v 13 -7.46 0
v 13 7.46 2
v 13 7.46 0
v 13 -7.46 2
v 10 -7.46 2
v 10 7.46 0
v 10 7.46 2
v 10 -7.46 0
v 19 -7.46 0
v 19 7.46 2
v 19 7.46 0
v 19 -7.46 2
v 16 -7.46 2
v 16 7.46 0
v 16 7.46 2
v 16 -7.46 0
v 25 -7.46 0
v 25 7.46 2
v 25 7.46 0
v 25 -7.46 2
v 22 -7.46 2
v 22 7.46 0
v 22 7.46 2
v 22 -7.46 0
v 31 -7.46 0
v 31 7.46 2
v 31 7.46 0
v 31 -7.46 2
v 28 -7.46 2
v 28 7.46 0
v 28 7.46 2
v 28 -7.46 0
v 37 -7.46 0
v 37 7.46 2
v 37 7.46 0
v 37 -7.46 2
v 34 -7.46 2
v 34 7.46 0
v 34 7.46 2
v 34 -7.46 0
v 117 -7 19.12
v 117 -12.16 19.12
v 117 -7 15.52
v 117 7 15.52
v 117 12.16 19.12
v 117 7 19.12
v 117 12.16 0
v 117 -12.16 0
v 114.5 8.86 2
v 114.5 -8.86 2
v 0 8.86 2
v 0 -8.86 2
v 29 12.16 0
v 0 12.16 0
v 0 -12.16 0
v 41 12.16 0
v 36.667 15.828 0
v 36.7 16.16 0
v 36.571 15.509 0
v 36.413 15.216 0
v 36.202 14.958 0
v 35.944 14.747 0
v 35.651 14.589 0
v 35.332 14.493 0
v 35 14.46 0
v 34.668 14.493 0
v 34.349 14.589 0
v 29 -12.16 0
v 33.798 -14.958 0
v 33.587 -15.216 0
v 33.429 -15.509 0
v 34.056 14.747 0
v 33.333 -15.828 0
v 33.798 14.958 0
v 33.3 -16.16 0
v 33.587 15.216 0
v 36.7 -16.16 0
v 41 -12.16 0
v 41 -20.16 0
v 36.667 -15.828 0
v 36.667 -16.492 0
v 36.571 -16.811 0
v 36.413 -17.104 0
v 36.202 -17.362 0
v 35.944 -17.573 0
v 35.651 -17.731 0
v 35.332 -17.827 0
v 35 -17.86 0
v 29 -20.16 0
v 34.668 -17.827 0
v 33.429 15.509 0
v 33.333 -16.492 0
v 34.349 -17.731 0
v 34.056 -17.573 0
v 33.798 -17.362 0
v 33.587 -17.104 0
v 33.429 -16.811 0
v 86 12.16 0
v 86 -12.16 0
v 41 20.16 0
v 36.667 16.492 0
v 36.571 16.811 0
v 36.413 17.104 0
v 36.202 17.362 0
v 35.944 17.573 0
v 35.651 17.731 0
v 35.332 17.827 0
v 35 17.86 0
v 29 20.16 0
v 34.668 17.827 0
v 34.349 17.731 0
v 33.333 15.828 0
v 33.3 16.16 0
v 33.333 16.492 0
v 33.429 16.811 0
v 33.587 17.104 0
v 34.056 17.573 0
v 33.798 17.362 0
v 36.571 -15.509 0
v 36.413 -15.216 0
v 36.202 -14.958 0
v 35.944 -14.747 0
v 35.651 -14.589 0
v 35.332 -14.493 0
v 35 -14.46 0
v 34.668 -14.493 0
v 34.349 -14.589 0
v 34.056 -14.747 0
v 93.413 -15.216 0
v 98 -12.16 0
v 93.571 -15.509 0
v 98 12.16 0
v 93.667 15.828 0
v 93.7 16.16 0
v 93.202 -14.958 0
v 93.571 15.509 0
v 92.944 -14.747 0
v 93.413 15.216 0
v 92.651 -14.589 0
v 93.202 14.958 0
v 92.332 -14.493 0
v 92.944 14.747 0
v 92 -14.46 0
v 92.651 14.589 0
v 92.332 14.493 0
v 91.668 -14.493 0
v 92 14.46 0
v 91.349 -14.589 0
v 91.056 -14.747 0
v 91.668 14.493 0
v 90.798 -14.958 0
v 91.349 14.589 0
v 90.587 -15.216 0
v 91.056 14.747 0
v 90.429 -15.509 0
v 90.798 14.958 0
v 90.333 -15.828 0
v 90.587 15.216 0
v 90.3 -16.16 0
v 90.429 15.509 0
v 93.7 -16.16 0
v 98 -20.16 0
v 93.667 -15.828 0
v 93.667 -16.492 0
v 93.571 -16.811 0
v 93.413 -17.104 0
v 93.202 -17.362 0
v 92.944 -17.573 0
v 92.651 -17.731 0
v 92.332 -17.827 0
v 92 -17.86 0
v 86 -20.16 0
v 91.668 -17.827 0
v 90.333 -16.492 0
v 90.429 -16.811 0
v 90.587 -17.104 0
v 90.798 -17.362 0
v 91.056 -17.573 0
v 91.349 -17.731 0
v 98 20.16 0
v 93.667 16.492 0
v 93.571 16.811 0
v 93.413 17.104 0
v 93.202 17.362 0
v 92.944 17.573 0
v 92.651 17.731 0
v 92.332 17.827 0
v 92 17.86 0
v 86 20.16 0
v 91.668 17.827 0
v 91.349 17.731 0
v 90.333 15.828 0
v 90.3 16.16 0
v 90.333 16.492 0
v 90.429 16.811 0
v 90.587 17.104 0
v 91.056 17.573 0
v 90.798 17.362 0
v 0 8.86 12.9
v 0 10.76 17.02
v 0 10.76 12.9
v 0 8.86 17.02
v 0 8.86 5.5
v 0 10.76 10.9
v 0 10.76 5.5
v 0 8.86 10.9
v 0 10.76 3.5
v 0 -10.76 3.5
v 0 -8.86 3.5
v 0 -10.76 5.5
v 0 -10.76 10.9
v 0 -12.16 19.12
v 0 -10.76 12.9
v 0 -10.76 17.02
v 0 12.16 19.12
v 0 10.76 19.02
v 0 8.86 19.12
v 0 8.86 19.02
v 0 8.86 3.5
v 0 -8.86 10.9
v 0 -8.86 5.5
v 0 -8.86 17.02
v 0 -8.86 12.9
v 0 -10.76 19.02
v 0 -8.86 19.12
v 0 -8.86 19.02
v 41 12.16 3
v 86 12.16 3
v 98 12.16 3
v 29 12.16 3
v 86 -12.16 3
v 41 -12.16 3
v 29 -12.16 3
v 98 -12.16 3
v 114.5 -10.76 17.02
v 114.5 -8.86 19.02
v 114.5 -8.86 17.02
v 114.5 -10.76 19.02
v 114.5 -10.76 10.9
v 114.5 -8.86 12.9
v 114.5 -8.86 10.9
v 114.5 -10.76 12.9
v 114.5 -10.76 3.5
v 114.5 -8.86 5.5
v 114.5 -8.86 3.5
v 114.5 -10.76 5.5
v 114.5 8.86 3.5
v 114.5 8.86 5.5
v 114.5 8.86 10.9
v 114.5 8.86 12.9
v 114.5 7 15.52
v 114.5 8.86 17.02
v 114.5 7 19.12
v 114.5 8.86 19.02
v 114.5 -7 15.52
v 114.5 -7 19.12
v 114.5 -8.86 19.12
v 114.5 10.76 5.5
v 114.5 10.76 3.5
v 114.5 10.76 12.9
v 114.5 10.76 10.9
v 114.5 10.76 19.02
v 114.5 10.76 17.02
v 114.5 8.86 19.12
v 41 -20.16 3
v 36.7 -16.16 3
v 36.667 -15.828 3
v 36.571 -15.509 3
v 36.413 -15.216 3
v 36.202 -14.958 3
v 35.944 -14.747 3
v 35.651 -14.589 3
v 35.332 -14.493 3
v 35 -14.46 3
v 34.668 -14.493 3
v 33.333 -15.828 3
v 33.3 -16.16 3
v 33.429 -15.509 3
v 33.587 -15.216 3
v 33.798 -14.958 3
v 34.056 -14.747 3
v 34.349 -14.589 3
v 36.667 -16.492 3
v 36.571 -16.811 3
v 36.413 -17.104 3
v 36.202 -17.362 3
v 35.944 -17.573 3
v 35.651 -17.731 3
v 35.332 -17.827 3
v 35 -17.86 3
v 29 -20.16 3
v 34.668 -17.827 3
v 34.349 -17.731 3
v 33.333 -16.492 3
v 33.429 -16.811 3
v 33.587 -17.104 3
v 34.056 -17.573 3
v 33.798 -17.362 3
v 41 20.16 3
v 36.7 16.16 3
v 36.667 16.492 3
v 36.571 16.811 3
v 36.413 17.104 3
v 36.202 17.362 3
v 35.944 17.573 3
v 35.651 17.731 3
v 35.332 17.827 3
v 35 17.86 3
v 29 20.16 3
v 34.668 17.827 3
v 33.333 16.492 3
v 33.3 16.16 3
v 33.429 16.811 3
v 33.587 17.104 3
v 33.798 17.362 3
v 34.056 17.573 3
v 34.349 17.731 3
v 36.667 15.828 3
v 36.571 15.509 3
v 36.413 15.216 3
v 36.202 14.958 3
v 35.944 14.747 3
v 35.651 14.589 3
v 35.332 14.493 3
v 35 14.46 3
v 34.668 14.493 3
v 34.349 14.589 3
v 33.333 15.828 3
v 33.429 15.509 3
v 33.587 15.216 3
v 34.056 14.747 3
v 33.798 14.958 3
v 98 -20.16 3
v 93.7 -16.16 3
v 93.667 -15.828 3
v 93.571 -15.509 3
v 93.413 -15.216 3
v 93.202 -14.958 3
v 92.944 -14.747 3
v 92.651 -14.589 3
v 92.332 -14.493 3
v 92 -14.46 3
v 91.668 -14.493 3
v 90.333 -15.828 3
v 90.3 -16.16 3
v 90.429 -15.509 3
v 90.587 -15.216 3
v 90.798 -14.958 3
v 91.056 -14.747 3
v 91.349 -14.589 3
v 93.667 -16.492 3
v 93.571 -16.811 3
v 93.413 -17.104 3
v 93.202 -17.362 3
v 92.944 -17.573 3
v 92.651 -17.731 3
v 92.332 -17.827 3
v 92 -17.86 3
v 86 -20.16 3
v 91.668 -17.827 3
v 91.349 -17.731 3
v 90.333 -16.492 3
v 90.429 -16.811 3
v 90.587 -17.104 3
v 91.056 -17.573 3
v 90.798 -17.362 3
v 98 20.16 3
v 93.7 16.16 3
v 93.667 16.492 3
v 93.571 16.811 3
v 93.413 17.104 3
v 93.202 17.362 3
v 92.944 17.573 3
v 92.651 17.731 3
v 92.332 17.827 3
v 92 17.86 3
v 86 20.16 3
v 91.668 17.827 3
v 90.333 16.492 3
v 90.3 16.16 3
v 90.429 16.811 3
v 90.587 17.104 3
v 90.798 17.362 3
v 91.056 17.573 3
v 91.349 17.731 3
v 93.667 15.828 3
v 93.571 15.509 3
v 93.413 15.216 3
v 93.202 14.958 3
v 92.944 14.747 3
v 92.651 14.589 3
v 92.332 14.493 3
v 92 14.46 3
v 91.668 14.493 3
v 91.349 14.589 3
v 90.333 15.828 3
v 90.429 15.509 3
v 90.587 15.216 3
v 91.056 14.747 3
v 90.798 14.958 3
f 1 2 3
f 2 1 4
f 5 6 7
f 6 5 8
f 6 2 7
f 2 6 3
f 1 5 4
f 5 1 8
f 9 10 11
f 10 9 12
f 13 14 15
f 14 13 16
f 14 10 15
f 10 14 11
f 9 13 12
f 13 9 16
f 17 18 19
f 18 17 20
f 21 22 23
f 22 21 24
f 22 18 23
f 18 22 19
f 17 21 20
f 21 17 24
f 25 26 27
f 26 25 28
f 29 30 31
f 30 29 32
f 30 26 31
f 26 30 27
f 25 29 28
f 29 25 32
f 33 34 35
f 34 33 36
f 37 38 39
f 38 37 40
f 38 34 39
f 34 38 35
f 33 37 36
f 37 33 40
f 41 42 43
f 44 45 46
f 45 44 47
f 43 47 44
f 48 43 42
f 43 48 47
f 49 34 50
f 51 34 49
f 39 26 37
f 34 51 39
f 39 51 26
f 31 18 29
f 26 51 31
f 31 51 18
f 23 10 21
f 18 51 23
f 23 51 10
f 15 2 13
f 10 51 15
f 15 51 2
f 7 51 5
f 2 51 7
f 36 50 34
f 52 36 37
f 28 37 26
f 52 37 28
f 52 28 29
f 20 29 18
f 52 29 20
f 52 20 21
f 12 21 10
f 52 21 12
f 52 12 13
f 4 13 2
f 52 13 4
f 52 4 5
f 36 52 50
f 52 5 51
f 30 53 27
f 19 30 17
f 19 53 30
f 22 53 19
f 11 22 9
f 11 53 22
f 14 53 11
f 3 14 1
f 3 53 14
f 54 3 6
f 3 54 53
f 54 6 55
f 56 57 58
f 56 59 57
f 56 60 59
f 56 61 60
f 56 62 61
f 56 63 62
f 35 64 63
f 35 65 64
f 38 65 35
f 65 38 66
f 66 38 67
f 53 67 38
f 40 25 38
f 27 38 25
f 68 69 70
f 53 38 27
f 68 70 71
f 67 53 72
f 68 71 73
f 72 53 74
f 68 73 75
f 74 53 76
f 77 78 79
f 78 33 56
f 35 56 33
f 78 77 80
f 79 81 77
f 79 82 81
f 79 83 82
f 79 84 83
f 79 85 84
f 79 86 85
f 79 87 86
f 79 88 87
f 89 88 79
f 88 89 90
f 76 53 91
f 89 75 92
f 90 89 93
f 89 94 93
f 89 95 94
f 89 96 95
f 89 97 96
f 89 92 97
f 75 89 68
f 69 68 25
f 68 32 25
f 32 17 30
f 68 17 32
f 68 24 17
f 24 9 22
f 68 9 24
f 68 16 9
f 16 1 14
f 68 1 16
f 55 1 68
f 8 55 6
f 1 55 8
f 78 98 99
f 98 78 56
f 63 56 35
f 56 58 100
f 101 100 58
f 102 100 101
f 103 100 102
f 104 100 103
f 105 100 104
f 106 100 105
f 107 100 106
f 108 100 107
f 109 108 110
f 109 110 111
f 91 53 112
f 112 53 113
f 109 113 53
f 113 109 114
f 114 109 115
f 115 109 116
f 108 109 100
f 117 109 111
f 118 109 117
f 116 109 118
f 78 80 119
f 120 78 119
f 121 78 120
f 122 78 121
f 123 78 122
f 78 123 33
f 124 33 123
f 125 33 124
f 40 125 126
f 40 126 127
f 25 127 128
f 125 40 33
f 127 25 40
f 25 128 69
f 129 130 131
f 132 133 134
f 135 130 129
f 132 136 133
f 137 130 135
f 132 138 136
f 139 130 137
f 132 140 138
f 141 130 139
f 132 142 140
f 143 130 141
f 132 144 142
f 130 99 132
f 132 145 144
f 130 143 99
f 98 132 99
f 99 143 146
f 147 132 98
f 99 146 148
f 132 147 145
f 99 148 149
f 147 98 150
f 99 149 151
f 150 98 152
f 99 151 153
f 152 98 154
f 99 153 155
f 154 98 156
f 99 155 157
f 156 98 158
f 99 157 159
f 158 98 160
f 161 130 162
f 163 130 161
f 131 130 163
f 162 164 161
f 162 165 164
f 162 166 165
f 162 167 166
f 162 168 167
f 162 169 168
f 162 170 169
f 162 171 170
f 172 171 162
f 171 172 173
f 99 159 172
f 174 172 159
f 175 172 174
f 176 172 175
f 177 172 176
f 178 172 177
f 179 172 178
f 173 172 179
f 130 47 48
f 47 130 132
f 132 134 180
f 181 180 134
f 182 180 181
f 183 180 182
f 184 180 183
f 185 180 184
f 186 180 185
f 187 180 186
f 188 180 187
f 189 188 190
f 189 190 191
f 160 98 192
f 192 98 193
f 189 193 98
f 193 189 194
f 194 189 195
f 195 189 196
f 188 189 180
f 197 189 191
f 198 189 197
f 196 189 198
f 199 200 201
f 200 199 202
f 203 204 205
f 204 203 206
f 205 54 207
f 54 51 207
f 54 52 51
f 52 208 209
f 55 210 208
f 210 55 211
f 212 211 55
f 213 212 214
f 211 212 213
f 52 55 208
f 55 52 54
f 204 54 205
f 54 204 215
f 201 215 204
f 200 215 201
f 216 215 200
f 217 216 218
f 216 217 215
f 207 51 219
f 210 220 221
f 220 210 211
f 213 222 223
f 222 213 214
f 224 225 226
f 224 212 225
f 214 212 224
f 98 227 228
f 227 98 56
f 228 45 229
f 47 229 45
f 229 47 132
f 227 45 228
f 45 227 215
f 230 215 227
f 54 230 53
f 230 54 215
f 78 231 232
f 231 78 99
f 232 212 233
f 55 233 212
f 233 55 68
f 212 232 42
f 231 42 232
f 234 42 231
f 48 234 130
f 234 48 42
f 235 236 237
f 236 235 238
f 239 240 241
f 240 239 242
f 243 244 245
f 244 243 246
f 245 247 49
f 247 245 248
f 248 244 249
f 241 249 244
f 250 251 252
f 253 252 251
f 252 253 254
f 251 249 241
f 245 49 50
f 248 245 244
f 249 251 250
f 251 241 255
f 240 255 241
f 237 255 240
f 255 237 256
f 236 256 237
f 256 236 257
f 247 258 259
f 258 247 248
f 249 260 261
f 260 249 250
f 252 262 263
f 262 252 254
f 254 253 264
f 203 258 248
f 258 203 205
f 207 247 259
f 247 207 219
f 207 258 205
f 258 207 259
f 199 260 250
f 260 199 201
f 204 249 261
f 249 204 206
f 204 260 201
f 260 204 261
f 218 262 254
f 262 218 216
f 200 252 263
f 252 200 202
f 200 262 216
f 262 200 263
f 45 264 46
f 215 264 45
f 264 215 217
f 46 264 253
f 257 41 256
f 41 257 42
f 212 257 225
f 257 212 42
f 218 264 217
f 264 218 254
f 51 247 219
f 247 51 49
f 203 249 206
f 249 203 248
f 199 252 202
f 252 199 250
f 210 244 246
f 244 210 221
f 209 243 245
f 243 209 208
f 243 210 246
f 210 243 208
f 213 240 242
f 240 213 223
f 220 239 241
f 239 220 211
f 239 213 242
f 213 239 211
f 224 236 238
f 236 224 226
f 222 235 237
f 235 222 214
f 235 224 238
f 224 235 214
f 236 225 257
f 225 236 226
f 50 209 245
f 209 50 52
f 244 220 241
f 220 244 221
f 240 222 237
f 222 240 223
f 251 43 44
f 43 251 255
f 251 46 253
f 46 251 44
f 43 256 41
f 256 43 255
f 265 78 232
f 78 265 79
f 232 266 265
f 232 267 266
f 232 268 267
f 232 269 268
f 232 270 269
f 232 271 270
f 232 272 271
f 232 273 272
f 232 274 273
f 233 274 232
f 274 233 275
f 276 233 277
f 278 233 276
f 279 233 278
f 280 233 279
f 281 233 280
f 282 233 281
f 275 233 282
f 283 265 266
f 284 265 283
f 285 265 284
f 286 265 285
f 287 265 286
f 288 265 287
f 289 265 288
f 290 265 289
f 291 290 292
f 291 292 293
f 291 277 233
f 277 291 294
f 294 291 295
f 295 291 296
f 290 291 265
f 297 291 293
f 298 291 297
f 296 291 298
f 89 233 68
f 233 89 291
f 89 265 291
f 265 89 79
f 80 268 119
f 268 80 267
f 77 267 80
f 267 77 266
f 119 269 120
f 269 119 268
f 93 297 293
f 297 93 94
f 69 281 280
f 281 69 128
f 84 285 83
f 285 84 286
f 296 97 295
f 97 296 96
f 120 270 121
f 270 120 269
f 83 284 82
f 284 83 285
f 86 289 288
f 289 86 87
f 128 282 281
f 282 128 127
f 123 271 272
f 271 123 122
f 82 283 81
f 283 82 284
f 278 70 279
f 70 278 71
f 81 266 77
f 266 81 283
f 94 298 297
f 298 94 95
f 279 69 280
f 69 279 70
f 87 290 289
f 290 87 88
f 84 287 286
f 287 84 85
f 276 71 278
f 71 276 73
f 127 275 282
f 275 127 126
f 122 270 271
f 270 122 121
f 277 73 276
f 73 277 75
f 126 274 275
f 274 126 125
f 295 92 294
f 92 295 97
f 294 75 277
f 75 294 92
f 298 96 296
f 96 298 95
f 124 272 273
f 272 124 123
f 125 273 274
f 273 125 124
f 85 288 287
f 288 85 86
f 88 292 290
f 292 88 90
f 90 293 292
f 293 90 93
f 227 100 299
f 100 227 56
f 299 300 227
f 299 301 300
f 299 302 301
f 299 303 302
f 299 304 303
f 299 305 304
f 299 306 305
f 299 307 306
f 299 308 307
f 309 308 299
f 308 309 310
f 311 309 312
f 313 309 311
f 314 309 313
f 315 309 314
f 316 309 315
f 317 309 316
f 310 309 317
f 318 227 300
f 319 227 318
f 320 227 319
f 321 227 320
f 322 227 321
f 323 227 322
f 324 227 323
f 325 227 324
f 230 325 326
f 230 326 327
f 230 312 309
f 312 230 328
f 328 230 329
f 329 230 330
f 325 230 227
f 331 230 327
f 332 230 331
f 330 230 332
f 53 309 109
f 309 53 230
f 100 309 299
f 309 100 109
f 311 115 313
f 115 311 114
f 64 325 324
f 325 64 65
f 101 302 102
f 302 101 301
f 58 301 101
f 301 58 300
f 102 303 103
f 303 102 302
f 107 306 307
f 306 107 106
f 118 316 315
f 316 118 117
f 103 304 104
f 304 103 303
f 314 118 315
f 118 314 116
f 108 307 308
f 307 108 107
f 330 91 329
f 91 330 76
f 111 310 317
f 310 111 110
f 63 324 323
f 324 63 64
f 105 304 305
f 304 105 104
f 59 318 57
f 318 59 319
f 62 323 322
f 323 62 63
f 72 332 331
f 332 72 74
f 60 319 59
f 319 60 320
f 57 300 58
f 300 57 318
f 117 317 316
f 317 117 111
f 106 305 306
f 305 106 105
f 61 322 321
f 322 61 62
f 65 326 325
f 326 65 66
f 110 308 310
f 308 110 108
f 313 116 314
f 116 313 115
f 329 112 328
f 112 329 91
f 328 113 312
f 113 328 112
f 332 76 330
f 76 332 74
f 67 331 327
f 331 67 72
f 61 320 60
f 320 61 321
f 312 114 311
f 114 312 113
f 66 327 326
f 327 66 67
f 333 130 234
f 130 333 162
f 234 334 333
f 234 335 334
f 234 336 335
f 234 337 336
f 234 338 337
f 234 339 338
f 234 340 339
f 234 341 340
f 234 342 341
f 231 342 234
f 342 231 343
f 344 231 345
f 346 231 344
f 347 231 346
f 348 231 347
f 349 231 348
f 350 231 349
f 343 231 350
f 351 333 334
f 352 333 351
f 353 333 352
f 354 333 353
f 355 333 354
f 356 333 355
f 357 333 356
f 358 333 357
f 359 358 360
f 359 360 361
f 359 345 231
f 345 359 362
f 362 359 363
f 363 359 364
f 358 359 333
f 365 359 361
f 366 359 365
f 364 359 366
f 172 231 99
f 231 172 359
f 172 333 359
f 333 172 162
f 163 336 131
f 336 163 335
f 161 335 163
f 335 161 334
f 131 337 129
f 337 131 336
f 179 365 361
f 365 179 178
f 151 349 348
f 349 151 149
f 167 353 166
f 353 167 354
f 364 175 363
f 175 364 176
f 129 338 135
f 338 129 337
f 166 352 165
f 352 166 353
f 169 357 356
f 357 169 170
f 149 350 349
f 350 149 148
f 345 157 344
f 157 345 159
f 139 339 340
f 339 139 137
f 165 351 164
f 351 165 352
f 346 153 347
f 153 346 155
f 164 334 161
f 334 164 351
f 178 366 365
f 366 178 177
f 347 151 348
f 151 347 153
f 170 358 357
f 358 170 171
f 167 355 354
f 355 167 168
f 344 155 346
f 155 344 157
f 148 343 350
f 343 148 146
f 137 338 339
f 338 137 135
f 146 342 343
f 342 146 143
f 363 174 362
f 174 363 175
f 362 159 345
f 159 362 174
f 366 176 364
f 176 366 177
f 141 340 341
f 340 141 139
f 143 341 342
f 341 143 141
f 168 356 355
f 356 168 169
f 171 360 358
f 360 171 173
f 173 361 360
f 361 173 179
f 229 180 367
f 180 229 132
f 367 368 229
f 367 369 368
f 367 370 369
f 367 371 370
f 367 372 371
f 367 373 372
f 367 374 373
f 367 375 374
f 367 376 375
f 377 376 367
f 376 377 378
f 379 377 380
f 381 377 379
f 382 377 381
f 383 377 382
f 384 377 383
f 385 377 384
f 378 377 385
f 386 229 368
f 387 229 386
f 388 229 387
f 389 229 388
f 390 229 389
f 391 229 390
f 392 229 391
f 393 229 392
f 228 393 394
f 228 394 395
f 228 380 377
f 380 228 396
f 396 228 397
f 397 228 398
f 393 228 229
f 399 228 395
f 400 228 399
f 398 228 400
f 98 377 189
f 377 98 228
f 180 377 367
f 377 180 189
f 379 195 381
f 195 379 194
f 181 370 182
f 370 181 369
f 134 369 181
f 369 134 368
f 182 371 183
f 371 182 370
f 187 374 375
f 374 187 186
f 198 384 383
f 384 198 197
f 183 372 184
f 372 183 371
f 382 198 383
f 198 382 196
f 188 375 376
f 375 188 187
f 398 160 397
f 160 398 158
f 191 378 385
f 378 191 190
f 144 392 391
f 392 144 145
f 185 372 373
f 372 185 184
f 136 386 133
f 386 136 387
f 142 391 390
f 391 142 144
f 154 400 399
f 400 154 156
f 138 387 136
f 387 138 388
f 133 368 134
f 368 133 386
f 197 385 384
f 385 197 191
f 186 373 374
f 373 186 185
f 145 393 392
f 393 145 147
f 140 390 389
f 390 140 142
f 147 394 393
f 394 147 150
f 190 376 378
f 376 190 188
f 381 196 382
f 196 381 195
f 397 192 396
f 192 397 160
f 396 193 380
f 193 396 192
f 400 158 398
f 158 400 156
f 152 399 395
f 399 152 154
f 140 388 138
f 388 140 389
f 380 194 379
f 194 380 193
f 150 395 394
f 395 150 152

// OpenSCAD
// ============================================================================
// CyberWing — CO sensor enclosure, 3-TIER CARD CAGE (SPEC USB stick)
// The rigid 3-board stack (USB-UART / AFE / SPEC cell) slides in axially; each
// board edge rides a groove on the long walls. The CO cell is internal (faces
// up into the 5.80 mm gap, fed by the 5.09 mm port in the middle board), so the
// cell (-X) end stays OPEN for airflow — nothing is ever put through the port.
//   X = length (cell -X open, USB +X stop) ; Y = width ; Z = up (tiers).
// part = base | both. Print floor-down (grooves bridge ~ENG, no supports).
// ============================================================================
$fn = 32;
part = "both";

// ---- measured ----
PCB_L = 114.00; PCB_W = 20.92; PCB_T = 1.6;
GAP1 = 5.80;                 // cell board -> middle board (measured)
GAP2 = 4.52;                 // middle -> top (derived from 15.12 total; CONFIRM)
CLR  = 0.4;                  // slot clearance

// ---- cage ----
ENG = 1.6; BACK = 1.5; FLOOR = 2.0; END_WALL = 2.5; FLR_GAP = 1.5;
USB_W = 14;                  // top notch in the +X stop wall for the USB plug
VENT_W = 3; VENT_PITCH = 6;  // floor slots under the cell
EAR_X = [35, 92]; M3 = 3.4;

// ---- derived tiers (board bottoms, from floor top) ----
b1 = FLR_GAP;
b2 = b1 + PCB_T + GAP1;
b3 = b2 + PCB_T + GAP2;
tiers = [b1, b2, b3];
stack_top = b3 + PCB_T;

RIBY = PCB_W/2 - ENG;        // rib inner face (Y)
GFLR = PCB_W/2 + CLR/2;      // groove floor (Y)
ox = 2*(GFLR + BACK);        // outer width
cavlen = PCB_L + 0.5;        // cavity length (-X open)
Llen = cavlen + END_WALL;
oz = FLOOR + stack_top + 0.5;
SLOT_H = PCB_T + CLR;

module wall(sy) {
  difference() {
    translate([0, sy>0 ? RIBY : -(GFLR+BACK), FLOOR]) cube([Llen, GFLR+BACK-RIBY, oz-FLOOR]);
    for (tb = tiers)                                            // 3 grooves, open at -X
      translate([-0.1, sy>0 ? RIBY-0.1 : -(GFLR+0.1), FLOOR+tb])
        cube([cavlen+0.1, GFLR-RIBY+0.2, SLOT_H]);
  }
}

module base() {
  // floor with cell vents
  difference() {
    translate([0, -ox/2, 0]) cube([Llen, ox, FLOOR]);
    for (x = [10 : VENT_PITCH : 34])
      translate([x, -(PCB_W/2-3), -0.1]) cube([VENT_W, PCB_W-6, FLOOR+0.2]);
  }
  // two grooved side walls
  wall(1); wall(-1);
  // +X stop wall with a top notch for the USB plug
  difference() {
    translate([cavlen, -ox/2, 0]) cube([END_WALL, ox, oz]);
    translate([cavlen-0.1, -USB_W/2, FLOOR+b3-1.5]) cube([END_WALL+0.2, USB_W, oz]);
  }
  // mounting ears (both long sides, 2 per side)
  for (x = EAR_X, sy = [-1, 1])
    difference() {
      translate([x-6, sy>0 ? ox/2 : -ox/2-8, 0]) cube([12, 8, 3]);
      translate([x, sy*(ox/2+4), -0.1]) cylinder(d=M3, h=4);
    }
}

base();
